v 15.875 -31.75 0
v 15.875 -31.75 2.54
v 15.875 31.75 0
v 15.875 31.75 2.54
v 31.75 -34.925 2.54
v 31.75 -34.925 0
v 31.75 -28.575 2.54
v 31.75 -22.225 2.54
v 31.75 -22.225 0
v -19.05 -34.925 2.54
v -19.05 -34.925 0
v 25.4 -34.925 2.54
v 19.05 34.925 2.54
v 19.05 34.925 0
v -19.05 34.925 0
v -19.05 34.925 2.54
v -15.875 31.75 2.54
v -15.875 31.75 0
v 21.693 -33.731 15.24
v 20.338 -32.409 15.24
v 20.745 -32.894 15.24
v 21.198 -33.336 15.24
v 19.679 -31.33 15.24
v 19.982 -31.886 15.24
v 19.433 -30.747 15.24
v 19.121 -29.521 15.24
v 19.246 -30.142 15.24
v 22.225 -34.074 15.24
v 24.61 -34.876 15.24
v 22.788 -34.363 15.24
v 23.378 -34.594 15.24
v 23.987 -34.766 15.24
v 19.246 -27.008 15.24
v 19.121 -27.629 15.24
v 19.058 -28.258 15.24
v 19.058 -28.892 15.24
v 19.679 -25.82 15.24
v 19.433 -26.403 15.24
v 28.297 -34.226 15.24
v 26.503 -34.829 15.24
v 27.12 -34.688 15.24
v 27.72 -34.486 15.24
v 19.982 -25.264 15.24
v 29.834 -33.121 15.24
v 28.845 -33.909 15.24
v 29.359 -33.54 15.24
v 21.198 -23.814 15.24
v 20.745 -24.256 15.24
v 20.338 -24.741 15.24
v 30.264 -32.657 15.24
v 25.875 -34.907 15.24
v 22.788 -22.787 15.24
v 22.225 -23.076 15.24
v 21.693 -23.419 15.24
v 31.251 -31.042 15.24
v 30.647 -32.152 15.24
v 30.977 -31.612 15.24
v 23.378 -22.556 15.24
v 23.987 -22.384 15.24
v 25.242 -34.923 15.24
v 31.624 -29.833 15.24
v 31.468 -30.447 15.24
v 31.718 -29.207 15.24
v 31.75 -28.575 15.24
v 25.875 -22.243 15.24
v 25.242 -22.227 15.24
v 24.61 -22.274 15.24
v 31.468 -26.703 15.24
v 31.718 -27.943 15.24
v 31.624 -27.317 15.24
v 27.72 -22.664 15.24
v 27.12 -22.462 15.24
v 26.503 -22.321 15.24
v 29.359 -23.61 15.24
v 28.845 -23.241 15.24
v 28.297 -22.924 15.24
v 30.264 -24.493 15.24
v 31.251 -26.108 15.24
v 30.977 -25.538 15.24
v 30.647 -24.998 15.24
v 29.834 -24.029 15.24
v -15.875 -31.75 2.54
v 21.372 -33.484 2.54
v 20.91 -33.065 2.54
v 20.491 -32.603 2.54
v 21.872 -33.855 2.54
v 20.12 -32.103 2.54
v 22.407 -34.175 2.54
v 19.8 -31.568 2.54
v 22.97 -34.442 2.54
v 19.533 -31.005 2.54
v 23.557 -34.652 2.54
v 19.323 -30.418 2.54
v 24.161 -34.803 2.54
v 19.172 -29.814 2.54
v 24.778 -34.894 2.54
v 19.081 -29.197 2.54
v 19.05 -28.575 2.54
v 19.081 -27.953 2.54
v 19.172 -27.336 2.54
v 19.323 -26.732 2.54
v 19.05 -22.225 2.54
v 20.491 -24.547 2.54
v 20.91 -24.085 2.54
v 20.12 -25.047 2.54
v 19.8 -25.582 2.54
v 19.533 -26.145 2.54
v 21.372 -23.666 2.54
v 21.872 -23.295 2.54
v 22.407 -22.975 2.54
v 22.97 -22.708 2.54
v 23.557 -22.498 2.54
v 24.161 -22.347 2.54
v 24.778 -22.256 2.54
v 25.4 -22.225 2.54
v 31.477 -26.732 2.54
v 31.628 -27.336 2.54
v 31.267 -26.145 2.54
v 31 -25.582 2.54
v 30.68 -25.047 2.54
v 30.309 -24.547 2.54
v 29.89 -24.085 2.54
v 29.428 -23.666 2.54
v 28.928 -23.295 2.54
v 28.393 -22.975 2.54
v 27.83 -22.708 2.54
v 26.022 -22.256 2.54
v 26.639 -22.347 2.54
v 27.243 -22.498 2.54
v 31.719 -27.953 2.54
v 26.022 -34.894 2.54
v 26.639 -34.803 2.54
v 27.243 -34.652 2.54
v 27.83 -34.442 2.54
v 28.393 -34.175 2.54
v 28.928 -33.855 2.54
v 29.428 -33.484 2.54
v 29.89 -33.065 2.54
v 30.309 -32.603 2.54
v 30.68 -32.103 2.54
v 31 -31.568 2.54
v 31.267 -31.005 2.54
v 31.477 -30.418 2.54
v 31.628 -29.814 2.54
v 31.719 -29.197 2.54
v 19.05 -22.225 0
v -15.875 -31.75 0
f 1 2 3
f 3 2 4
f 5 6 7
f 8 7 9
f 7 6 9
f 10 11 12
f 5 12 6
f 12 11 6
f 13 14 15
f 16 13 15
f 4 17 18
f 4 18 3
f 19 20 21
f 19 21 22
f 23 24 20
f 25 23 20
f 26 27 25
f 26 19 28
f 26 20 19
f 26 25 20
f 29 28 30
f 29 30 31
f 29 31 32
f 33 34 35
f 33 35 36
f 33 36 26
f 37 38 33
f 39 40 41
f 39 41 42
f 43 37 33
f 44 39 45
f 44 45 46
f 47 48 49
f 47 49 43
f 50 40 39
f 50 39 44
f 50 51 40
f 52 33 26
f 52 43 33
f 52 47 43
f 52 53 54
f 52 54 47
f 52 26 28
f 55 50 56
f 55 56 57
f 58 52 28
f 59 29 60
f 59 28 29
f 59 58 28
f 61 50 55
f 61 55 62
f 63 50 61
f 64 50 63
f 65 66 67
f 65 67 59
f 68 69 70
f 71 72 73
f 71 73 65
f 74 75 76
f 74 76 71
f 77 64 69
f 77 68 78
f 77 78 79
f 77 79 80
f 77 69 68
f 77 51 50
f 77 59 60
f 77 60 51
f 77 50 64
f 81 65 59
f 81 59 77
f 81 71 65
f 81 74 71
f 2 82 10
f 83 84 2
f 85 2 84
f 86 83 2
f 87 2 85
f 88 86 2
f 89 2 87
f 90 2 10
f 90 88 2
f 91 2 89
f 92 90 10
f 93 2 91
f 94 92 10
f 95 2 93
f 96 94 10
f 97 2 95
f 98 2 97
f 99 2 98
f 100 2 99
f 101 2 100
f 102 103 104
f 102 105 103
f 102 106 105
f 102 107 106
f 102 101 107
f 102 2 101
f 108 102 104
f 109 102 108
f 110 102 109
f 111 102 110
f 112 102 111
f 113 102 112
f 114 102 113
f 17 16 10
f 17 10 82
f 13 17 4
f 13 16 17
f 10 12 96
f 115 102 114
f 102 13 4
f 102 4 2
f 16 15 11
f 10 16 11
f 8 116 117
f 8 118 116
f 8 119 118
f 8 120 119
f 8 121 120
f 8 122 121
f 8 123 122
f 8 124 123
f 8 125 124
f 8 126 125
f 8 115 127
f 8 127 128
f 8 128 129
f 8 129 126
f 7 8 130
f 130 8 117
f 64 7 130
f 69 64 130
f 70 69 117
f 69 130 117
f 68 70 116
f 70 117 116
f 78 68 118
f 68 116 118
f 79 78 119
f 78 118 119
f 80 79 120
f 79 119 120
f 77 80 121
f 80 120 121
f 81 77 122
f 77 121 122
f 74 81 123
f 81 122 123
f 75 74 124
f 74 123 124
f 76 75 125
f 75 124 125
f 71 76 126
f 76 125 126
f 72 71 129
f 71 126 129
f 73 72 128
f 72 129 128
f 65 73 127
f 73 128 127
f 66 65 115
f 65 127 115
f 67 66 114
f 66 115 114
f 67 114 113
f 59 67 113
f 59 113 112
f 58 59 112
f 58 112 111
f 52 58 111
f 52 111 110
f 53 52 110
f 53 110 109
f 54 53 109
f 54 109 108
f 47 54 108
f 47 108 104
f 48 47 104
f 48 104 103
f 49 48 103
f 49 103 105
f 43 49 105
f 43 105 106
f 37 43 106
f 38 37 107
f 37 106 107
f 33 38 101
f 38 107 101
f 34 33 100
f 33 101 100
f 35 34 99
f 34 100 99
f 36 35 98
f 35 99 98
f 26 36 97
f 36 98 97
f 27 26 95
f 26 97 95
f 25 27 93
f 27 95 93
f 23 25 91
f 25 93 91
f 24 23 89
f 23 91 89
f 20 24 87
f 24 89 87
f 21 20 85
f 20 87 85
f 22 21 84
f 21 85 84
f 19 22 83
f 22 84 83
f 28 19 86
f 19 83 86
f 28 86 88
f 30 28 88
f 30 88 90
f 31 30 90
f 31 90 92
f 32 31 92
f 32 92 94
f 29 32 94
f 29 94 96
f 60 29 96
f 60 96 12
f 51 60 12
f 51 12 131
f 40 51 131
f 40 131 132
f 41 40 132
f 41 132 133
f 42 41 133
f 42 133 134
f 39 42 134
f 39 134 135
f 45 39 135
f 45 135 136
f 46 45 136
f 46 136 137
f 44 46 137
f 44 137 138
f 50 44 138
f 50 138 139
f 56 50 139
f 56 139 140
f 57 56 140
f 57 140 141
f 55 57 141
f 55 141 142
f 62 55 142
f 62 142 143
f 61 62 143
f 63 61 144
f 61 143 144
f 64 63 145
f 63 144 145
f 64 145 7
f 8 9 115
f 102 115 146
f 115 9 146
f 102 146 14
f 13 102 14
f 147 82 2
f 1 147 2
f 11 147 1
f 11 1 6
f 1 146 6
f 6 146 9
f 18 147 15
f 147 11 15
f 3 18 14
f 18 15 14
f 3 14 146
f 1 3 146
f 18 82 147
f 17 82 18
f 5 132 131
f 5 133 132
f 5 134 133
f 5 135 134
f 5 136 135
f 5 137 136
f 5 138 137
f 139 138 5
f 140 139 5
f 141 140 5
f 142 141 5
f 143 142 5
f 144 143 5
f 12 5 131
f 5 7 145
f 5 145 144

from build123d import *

# Parameters (mm, degrees)
BOSS_EXTRUDE1_DEPTH = 2.54
SKETCH2_W           = 31.75
SKETCH2_H           = 63.5
CUT_EXTRUDE1_DEPTH  = 48.268062421
SKETCH3_R           = 6.35
BOSS_EXTRUDE2_DEPTH = 12.7


with BuildPart() as part:
    # Sketch1 → Boss-Extrude1 (new body)
    with BuildSketch(Plane.XY):
        Polygon((-19.05, -34.925), (19.05, -34.925), (31.75, -34.925), (31.75, -22.225), (19.05, -22.225), (19.05, 34.925), (-19.05, 34.925), align=None)
    extrude(amount=BOSS_EXTRUDE1_DEPTH)

    # Sketch2 → Cut-Extrude1 (cut, through all)
    with BuildSketch(Plane.XY.offset(2.54)):
        Rectangle(SKETCH2_W, SKETCH2_H)
    extrude(amount=-CUT_EXTRUDE1_DEPTH, mode=Mode.SUBTRACT)

    # Sketch3 → Boss-Extrude2 (add)
    with BuildSketch(Plane.XY.offset(2.54)):
        with Locations((25.4, -28.575)):
            Circle(SKETCH3_R)
    extrude(amount=BOSS_EXTRUDE2_DEPTH)


solid = part.part
